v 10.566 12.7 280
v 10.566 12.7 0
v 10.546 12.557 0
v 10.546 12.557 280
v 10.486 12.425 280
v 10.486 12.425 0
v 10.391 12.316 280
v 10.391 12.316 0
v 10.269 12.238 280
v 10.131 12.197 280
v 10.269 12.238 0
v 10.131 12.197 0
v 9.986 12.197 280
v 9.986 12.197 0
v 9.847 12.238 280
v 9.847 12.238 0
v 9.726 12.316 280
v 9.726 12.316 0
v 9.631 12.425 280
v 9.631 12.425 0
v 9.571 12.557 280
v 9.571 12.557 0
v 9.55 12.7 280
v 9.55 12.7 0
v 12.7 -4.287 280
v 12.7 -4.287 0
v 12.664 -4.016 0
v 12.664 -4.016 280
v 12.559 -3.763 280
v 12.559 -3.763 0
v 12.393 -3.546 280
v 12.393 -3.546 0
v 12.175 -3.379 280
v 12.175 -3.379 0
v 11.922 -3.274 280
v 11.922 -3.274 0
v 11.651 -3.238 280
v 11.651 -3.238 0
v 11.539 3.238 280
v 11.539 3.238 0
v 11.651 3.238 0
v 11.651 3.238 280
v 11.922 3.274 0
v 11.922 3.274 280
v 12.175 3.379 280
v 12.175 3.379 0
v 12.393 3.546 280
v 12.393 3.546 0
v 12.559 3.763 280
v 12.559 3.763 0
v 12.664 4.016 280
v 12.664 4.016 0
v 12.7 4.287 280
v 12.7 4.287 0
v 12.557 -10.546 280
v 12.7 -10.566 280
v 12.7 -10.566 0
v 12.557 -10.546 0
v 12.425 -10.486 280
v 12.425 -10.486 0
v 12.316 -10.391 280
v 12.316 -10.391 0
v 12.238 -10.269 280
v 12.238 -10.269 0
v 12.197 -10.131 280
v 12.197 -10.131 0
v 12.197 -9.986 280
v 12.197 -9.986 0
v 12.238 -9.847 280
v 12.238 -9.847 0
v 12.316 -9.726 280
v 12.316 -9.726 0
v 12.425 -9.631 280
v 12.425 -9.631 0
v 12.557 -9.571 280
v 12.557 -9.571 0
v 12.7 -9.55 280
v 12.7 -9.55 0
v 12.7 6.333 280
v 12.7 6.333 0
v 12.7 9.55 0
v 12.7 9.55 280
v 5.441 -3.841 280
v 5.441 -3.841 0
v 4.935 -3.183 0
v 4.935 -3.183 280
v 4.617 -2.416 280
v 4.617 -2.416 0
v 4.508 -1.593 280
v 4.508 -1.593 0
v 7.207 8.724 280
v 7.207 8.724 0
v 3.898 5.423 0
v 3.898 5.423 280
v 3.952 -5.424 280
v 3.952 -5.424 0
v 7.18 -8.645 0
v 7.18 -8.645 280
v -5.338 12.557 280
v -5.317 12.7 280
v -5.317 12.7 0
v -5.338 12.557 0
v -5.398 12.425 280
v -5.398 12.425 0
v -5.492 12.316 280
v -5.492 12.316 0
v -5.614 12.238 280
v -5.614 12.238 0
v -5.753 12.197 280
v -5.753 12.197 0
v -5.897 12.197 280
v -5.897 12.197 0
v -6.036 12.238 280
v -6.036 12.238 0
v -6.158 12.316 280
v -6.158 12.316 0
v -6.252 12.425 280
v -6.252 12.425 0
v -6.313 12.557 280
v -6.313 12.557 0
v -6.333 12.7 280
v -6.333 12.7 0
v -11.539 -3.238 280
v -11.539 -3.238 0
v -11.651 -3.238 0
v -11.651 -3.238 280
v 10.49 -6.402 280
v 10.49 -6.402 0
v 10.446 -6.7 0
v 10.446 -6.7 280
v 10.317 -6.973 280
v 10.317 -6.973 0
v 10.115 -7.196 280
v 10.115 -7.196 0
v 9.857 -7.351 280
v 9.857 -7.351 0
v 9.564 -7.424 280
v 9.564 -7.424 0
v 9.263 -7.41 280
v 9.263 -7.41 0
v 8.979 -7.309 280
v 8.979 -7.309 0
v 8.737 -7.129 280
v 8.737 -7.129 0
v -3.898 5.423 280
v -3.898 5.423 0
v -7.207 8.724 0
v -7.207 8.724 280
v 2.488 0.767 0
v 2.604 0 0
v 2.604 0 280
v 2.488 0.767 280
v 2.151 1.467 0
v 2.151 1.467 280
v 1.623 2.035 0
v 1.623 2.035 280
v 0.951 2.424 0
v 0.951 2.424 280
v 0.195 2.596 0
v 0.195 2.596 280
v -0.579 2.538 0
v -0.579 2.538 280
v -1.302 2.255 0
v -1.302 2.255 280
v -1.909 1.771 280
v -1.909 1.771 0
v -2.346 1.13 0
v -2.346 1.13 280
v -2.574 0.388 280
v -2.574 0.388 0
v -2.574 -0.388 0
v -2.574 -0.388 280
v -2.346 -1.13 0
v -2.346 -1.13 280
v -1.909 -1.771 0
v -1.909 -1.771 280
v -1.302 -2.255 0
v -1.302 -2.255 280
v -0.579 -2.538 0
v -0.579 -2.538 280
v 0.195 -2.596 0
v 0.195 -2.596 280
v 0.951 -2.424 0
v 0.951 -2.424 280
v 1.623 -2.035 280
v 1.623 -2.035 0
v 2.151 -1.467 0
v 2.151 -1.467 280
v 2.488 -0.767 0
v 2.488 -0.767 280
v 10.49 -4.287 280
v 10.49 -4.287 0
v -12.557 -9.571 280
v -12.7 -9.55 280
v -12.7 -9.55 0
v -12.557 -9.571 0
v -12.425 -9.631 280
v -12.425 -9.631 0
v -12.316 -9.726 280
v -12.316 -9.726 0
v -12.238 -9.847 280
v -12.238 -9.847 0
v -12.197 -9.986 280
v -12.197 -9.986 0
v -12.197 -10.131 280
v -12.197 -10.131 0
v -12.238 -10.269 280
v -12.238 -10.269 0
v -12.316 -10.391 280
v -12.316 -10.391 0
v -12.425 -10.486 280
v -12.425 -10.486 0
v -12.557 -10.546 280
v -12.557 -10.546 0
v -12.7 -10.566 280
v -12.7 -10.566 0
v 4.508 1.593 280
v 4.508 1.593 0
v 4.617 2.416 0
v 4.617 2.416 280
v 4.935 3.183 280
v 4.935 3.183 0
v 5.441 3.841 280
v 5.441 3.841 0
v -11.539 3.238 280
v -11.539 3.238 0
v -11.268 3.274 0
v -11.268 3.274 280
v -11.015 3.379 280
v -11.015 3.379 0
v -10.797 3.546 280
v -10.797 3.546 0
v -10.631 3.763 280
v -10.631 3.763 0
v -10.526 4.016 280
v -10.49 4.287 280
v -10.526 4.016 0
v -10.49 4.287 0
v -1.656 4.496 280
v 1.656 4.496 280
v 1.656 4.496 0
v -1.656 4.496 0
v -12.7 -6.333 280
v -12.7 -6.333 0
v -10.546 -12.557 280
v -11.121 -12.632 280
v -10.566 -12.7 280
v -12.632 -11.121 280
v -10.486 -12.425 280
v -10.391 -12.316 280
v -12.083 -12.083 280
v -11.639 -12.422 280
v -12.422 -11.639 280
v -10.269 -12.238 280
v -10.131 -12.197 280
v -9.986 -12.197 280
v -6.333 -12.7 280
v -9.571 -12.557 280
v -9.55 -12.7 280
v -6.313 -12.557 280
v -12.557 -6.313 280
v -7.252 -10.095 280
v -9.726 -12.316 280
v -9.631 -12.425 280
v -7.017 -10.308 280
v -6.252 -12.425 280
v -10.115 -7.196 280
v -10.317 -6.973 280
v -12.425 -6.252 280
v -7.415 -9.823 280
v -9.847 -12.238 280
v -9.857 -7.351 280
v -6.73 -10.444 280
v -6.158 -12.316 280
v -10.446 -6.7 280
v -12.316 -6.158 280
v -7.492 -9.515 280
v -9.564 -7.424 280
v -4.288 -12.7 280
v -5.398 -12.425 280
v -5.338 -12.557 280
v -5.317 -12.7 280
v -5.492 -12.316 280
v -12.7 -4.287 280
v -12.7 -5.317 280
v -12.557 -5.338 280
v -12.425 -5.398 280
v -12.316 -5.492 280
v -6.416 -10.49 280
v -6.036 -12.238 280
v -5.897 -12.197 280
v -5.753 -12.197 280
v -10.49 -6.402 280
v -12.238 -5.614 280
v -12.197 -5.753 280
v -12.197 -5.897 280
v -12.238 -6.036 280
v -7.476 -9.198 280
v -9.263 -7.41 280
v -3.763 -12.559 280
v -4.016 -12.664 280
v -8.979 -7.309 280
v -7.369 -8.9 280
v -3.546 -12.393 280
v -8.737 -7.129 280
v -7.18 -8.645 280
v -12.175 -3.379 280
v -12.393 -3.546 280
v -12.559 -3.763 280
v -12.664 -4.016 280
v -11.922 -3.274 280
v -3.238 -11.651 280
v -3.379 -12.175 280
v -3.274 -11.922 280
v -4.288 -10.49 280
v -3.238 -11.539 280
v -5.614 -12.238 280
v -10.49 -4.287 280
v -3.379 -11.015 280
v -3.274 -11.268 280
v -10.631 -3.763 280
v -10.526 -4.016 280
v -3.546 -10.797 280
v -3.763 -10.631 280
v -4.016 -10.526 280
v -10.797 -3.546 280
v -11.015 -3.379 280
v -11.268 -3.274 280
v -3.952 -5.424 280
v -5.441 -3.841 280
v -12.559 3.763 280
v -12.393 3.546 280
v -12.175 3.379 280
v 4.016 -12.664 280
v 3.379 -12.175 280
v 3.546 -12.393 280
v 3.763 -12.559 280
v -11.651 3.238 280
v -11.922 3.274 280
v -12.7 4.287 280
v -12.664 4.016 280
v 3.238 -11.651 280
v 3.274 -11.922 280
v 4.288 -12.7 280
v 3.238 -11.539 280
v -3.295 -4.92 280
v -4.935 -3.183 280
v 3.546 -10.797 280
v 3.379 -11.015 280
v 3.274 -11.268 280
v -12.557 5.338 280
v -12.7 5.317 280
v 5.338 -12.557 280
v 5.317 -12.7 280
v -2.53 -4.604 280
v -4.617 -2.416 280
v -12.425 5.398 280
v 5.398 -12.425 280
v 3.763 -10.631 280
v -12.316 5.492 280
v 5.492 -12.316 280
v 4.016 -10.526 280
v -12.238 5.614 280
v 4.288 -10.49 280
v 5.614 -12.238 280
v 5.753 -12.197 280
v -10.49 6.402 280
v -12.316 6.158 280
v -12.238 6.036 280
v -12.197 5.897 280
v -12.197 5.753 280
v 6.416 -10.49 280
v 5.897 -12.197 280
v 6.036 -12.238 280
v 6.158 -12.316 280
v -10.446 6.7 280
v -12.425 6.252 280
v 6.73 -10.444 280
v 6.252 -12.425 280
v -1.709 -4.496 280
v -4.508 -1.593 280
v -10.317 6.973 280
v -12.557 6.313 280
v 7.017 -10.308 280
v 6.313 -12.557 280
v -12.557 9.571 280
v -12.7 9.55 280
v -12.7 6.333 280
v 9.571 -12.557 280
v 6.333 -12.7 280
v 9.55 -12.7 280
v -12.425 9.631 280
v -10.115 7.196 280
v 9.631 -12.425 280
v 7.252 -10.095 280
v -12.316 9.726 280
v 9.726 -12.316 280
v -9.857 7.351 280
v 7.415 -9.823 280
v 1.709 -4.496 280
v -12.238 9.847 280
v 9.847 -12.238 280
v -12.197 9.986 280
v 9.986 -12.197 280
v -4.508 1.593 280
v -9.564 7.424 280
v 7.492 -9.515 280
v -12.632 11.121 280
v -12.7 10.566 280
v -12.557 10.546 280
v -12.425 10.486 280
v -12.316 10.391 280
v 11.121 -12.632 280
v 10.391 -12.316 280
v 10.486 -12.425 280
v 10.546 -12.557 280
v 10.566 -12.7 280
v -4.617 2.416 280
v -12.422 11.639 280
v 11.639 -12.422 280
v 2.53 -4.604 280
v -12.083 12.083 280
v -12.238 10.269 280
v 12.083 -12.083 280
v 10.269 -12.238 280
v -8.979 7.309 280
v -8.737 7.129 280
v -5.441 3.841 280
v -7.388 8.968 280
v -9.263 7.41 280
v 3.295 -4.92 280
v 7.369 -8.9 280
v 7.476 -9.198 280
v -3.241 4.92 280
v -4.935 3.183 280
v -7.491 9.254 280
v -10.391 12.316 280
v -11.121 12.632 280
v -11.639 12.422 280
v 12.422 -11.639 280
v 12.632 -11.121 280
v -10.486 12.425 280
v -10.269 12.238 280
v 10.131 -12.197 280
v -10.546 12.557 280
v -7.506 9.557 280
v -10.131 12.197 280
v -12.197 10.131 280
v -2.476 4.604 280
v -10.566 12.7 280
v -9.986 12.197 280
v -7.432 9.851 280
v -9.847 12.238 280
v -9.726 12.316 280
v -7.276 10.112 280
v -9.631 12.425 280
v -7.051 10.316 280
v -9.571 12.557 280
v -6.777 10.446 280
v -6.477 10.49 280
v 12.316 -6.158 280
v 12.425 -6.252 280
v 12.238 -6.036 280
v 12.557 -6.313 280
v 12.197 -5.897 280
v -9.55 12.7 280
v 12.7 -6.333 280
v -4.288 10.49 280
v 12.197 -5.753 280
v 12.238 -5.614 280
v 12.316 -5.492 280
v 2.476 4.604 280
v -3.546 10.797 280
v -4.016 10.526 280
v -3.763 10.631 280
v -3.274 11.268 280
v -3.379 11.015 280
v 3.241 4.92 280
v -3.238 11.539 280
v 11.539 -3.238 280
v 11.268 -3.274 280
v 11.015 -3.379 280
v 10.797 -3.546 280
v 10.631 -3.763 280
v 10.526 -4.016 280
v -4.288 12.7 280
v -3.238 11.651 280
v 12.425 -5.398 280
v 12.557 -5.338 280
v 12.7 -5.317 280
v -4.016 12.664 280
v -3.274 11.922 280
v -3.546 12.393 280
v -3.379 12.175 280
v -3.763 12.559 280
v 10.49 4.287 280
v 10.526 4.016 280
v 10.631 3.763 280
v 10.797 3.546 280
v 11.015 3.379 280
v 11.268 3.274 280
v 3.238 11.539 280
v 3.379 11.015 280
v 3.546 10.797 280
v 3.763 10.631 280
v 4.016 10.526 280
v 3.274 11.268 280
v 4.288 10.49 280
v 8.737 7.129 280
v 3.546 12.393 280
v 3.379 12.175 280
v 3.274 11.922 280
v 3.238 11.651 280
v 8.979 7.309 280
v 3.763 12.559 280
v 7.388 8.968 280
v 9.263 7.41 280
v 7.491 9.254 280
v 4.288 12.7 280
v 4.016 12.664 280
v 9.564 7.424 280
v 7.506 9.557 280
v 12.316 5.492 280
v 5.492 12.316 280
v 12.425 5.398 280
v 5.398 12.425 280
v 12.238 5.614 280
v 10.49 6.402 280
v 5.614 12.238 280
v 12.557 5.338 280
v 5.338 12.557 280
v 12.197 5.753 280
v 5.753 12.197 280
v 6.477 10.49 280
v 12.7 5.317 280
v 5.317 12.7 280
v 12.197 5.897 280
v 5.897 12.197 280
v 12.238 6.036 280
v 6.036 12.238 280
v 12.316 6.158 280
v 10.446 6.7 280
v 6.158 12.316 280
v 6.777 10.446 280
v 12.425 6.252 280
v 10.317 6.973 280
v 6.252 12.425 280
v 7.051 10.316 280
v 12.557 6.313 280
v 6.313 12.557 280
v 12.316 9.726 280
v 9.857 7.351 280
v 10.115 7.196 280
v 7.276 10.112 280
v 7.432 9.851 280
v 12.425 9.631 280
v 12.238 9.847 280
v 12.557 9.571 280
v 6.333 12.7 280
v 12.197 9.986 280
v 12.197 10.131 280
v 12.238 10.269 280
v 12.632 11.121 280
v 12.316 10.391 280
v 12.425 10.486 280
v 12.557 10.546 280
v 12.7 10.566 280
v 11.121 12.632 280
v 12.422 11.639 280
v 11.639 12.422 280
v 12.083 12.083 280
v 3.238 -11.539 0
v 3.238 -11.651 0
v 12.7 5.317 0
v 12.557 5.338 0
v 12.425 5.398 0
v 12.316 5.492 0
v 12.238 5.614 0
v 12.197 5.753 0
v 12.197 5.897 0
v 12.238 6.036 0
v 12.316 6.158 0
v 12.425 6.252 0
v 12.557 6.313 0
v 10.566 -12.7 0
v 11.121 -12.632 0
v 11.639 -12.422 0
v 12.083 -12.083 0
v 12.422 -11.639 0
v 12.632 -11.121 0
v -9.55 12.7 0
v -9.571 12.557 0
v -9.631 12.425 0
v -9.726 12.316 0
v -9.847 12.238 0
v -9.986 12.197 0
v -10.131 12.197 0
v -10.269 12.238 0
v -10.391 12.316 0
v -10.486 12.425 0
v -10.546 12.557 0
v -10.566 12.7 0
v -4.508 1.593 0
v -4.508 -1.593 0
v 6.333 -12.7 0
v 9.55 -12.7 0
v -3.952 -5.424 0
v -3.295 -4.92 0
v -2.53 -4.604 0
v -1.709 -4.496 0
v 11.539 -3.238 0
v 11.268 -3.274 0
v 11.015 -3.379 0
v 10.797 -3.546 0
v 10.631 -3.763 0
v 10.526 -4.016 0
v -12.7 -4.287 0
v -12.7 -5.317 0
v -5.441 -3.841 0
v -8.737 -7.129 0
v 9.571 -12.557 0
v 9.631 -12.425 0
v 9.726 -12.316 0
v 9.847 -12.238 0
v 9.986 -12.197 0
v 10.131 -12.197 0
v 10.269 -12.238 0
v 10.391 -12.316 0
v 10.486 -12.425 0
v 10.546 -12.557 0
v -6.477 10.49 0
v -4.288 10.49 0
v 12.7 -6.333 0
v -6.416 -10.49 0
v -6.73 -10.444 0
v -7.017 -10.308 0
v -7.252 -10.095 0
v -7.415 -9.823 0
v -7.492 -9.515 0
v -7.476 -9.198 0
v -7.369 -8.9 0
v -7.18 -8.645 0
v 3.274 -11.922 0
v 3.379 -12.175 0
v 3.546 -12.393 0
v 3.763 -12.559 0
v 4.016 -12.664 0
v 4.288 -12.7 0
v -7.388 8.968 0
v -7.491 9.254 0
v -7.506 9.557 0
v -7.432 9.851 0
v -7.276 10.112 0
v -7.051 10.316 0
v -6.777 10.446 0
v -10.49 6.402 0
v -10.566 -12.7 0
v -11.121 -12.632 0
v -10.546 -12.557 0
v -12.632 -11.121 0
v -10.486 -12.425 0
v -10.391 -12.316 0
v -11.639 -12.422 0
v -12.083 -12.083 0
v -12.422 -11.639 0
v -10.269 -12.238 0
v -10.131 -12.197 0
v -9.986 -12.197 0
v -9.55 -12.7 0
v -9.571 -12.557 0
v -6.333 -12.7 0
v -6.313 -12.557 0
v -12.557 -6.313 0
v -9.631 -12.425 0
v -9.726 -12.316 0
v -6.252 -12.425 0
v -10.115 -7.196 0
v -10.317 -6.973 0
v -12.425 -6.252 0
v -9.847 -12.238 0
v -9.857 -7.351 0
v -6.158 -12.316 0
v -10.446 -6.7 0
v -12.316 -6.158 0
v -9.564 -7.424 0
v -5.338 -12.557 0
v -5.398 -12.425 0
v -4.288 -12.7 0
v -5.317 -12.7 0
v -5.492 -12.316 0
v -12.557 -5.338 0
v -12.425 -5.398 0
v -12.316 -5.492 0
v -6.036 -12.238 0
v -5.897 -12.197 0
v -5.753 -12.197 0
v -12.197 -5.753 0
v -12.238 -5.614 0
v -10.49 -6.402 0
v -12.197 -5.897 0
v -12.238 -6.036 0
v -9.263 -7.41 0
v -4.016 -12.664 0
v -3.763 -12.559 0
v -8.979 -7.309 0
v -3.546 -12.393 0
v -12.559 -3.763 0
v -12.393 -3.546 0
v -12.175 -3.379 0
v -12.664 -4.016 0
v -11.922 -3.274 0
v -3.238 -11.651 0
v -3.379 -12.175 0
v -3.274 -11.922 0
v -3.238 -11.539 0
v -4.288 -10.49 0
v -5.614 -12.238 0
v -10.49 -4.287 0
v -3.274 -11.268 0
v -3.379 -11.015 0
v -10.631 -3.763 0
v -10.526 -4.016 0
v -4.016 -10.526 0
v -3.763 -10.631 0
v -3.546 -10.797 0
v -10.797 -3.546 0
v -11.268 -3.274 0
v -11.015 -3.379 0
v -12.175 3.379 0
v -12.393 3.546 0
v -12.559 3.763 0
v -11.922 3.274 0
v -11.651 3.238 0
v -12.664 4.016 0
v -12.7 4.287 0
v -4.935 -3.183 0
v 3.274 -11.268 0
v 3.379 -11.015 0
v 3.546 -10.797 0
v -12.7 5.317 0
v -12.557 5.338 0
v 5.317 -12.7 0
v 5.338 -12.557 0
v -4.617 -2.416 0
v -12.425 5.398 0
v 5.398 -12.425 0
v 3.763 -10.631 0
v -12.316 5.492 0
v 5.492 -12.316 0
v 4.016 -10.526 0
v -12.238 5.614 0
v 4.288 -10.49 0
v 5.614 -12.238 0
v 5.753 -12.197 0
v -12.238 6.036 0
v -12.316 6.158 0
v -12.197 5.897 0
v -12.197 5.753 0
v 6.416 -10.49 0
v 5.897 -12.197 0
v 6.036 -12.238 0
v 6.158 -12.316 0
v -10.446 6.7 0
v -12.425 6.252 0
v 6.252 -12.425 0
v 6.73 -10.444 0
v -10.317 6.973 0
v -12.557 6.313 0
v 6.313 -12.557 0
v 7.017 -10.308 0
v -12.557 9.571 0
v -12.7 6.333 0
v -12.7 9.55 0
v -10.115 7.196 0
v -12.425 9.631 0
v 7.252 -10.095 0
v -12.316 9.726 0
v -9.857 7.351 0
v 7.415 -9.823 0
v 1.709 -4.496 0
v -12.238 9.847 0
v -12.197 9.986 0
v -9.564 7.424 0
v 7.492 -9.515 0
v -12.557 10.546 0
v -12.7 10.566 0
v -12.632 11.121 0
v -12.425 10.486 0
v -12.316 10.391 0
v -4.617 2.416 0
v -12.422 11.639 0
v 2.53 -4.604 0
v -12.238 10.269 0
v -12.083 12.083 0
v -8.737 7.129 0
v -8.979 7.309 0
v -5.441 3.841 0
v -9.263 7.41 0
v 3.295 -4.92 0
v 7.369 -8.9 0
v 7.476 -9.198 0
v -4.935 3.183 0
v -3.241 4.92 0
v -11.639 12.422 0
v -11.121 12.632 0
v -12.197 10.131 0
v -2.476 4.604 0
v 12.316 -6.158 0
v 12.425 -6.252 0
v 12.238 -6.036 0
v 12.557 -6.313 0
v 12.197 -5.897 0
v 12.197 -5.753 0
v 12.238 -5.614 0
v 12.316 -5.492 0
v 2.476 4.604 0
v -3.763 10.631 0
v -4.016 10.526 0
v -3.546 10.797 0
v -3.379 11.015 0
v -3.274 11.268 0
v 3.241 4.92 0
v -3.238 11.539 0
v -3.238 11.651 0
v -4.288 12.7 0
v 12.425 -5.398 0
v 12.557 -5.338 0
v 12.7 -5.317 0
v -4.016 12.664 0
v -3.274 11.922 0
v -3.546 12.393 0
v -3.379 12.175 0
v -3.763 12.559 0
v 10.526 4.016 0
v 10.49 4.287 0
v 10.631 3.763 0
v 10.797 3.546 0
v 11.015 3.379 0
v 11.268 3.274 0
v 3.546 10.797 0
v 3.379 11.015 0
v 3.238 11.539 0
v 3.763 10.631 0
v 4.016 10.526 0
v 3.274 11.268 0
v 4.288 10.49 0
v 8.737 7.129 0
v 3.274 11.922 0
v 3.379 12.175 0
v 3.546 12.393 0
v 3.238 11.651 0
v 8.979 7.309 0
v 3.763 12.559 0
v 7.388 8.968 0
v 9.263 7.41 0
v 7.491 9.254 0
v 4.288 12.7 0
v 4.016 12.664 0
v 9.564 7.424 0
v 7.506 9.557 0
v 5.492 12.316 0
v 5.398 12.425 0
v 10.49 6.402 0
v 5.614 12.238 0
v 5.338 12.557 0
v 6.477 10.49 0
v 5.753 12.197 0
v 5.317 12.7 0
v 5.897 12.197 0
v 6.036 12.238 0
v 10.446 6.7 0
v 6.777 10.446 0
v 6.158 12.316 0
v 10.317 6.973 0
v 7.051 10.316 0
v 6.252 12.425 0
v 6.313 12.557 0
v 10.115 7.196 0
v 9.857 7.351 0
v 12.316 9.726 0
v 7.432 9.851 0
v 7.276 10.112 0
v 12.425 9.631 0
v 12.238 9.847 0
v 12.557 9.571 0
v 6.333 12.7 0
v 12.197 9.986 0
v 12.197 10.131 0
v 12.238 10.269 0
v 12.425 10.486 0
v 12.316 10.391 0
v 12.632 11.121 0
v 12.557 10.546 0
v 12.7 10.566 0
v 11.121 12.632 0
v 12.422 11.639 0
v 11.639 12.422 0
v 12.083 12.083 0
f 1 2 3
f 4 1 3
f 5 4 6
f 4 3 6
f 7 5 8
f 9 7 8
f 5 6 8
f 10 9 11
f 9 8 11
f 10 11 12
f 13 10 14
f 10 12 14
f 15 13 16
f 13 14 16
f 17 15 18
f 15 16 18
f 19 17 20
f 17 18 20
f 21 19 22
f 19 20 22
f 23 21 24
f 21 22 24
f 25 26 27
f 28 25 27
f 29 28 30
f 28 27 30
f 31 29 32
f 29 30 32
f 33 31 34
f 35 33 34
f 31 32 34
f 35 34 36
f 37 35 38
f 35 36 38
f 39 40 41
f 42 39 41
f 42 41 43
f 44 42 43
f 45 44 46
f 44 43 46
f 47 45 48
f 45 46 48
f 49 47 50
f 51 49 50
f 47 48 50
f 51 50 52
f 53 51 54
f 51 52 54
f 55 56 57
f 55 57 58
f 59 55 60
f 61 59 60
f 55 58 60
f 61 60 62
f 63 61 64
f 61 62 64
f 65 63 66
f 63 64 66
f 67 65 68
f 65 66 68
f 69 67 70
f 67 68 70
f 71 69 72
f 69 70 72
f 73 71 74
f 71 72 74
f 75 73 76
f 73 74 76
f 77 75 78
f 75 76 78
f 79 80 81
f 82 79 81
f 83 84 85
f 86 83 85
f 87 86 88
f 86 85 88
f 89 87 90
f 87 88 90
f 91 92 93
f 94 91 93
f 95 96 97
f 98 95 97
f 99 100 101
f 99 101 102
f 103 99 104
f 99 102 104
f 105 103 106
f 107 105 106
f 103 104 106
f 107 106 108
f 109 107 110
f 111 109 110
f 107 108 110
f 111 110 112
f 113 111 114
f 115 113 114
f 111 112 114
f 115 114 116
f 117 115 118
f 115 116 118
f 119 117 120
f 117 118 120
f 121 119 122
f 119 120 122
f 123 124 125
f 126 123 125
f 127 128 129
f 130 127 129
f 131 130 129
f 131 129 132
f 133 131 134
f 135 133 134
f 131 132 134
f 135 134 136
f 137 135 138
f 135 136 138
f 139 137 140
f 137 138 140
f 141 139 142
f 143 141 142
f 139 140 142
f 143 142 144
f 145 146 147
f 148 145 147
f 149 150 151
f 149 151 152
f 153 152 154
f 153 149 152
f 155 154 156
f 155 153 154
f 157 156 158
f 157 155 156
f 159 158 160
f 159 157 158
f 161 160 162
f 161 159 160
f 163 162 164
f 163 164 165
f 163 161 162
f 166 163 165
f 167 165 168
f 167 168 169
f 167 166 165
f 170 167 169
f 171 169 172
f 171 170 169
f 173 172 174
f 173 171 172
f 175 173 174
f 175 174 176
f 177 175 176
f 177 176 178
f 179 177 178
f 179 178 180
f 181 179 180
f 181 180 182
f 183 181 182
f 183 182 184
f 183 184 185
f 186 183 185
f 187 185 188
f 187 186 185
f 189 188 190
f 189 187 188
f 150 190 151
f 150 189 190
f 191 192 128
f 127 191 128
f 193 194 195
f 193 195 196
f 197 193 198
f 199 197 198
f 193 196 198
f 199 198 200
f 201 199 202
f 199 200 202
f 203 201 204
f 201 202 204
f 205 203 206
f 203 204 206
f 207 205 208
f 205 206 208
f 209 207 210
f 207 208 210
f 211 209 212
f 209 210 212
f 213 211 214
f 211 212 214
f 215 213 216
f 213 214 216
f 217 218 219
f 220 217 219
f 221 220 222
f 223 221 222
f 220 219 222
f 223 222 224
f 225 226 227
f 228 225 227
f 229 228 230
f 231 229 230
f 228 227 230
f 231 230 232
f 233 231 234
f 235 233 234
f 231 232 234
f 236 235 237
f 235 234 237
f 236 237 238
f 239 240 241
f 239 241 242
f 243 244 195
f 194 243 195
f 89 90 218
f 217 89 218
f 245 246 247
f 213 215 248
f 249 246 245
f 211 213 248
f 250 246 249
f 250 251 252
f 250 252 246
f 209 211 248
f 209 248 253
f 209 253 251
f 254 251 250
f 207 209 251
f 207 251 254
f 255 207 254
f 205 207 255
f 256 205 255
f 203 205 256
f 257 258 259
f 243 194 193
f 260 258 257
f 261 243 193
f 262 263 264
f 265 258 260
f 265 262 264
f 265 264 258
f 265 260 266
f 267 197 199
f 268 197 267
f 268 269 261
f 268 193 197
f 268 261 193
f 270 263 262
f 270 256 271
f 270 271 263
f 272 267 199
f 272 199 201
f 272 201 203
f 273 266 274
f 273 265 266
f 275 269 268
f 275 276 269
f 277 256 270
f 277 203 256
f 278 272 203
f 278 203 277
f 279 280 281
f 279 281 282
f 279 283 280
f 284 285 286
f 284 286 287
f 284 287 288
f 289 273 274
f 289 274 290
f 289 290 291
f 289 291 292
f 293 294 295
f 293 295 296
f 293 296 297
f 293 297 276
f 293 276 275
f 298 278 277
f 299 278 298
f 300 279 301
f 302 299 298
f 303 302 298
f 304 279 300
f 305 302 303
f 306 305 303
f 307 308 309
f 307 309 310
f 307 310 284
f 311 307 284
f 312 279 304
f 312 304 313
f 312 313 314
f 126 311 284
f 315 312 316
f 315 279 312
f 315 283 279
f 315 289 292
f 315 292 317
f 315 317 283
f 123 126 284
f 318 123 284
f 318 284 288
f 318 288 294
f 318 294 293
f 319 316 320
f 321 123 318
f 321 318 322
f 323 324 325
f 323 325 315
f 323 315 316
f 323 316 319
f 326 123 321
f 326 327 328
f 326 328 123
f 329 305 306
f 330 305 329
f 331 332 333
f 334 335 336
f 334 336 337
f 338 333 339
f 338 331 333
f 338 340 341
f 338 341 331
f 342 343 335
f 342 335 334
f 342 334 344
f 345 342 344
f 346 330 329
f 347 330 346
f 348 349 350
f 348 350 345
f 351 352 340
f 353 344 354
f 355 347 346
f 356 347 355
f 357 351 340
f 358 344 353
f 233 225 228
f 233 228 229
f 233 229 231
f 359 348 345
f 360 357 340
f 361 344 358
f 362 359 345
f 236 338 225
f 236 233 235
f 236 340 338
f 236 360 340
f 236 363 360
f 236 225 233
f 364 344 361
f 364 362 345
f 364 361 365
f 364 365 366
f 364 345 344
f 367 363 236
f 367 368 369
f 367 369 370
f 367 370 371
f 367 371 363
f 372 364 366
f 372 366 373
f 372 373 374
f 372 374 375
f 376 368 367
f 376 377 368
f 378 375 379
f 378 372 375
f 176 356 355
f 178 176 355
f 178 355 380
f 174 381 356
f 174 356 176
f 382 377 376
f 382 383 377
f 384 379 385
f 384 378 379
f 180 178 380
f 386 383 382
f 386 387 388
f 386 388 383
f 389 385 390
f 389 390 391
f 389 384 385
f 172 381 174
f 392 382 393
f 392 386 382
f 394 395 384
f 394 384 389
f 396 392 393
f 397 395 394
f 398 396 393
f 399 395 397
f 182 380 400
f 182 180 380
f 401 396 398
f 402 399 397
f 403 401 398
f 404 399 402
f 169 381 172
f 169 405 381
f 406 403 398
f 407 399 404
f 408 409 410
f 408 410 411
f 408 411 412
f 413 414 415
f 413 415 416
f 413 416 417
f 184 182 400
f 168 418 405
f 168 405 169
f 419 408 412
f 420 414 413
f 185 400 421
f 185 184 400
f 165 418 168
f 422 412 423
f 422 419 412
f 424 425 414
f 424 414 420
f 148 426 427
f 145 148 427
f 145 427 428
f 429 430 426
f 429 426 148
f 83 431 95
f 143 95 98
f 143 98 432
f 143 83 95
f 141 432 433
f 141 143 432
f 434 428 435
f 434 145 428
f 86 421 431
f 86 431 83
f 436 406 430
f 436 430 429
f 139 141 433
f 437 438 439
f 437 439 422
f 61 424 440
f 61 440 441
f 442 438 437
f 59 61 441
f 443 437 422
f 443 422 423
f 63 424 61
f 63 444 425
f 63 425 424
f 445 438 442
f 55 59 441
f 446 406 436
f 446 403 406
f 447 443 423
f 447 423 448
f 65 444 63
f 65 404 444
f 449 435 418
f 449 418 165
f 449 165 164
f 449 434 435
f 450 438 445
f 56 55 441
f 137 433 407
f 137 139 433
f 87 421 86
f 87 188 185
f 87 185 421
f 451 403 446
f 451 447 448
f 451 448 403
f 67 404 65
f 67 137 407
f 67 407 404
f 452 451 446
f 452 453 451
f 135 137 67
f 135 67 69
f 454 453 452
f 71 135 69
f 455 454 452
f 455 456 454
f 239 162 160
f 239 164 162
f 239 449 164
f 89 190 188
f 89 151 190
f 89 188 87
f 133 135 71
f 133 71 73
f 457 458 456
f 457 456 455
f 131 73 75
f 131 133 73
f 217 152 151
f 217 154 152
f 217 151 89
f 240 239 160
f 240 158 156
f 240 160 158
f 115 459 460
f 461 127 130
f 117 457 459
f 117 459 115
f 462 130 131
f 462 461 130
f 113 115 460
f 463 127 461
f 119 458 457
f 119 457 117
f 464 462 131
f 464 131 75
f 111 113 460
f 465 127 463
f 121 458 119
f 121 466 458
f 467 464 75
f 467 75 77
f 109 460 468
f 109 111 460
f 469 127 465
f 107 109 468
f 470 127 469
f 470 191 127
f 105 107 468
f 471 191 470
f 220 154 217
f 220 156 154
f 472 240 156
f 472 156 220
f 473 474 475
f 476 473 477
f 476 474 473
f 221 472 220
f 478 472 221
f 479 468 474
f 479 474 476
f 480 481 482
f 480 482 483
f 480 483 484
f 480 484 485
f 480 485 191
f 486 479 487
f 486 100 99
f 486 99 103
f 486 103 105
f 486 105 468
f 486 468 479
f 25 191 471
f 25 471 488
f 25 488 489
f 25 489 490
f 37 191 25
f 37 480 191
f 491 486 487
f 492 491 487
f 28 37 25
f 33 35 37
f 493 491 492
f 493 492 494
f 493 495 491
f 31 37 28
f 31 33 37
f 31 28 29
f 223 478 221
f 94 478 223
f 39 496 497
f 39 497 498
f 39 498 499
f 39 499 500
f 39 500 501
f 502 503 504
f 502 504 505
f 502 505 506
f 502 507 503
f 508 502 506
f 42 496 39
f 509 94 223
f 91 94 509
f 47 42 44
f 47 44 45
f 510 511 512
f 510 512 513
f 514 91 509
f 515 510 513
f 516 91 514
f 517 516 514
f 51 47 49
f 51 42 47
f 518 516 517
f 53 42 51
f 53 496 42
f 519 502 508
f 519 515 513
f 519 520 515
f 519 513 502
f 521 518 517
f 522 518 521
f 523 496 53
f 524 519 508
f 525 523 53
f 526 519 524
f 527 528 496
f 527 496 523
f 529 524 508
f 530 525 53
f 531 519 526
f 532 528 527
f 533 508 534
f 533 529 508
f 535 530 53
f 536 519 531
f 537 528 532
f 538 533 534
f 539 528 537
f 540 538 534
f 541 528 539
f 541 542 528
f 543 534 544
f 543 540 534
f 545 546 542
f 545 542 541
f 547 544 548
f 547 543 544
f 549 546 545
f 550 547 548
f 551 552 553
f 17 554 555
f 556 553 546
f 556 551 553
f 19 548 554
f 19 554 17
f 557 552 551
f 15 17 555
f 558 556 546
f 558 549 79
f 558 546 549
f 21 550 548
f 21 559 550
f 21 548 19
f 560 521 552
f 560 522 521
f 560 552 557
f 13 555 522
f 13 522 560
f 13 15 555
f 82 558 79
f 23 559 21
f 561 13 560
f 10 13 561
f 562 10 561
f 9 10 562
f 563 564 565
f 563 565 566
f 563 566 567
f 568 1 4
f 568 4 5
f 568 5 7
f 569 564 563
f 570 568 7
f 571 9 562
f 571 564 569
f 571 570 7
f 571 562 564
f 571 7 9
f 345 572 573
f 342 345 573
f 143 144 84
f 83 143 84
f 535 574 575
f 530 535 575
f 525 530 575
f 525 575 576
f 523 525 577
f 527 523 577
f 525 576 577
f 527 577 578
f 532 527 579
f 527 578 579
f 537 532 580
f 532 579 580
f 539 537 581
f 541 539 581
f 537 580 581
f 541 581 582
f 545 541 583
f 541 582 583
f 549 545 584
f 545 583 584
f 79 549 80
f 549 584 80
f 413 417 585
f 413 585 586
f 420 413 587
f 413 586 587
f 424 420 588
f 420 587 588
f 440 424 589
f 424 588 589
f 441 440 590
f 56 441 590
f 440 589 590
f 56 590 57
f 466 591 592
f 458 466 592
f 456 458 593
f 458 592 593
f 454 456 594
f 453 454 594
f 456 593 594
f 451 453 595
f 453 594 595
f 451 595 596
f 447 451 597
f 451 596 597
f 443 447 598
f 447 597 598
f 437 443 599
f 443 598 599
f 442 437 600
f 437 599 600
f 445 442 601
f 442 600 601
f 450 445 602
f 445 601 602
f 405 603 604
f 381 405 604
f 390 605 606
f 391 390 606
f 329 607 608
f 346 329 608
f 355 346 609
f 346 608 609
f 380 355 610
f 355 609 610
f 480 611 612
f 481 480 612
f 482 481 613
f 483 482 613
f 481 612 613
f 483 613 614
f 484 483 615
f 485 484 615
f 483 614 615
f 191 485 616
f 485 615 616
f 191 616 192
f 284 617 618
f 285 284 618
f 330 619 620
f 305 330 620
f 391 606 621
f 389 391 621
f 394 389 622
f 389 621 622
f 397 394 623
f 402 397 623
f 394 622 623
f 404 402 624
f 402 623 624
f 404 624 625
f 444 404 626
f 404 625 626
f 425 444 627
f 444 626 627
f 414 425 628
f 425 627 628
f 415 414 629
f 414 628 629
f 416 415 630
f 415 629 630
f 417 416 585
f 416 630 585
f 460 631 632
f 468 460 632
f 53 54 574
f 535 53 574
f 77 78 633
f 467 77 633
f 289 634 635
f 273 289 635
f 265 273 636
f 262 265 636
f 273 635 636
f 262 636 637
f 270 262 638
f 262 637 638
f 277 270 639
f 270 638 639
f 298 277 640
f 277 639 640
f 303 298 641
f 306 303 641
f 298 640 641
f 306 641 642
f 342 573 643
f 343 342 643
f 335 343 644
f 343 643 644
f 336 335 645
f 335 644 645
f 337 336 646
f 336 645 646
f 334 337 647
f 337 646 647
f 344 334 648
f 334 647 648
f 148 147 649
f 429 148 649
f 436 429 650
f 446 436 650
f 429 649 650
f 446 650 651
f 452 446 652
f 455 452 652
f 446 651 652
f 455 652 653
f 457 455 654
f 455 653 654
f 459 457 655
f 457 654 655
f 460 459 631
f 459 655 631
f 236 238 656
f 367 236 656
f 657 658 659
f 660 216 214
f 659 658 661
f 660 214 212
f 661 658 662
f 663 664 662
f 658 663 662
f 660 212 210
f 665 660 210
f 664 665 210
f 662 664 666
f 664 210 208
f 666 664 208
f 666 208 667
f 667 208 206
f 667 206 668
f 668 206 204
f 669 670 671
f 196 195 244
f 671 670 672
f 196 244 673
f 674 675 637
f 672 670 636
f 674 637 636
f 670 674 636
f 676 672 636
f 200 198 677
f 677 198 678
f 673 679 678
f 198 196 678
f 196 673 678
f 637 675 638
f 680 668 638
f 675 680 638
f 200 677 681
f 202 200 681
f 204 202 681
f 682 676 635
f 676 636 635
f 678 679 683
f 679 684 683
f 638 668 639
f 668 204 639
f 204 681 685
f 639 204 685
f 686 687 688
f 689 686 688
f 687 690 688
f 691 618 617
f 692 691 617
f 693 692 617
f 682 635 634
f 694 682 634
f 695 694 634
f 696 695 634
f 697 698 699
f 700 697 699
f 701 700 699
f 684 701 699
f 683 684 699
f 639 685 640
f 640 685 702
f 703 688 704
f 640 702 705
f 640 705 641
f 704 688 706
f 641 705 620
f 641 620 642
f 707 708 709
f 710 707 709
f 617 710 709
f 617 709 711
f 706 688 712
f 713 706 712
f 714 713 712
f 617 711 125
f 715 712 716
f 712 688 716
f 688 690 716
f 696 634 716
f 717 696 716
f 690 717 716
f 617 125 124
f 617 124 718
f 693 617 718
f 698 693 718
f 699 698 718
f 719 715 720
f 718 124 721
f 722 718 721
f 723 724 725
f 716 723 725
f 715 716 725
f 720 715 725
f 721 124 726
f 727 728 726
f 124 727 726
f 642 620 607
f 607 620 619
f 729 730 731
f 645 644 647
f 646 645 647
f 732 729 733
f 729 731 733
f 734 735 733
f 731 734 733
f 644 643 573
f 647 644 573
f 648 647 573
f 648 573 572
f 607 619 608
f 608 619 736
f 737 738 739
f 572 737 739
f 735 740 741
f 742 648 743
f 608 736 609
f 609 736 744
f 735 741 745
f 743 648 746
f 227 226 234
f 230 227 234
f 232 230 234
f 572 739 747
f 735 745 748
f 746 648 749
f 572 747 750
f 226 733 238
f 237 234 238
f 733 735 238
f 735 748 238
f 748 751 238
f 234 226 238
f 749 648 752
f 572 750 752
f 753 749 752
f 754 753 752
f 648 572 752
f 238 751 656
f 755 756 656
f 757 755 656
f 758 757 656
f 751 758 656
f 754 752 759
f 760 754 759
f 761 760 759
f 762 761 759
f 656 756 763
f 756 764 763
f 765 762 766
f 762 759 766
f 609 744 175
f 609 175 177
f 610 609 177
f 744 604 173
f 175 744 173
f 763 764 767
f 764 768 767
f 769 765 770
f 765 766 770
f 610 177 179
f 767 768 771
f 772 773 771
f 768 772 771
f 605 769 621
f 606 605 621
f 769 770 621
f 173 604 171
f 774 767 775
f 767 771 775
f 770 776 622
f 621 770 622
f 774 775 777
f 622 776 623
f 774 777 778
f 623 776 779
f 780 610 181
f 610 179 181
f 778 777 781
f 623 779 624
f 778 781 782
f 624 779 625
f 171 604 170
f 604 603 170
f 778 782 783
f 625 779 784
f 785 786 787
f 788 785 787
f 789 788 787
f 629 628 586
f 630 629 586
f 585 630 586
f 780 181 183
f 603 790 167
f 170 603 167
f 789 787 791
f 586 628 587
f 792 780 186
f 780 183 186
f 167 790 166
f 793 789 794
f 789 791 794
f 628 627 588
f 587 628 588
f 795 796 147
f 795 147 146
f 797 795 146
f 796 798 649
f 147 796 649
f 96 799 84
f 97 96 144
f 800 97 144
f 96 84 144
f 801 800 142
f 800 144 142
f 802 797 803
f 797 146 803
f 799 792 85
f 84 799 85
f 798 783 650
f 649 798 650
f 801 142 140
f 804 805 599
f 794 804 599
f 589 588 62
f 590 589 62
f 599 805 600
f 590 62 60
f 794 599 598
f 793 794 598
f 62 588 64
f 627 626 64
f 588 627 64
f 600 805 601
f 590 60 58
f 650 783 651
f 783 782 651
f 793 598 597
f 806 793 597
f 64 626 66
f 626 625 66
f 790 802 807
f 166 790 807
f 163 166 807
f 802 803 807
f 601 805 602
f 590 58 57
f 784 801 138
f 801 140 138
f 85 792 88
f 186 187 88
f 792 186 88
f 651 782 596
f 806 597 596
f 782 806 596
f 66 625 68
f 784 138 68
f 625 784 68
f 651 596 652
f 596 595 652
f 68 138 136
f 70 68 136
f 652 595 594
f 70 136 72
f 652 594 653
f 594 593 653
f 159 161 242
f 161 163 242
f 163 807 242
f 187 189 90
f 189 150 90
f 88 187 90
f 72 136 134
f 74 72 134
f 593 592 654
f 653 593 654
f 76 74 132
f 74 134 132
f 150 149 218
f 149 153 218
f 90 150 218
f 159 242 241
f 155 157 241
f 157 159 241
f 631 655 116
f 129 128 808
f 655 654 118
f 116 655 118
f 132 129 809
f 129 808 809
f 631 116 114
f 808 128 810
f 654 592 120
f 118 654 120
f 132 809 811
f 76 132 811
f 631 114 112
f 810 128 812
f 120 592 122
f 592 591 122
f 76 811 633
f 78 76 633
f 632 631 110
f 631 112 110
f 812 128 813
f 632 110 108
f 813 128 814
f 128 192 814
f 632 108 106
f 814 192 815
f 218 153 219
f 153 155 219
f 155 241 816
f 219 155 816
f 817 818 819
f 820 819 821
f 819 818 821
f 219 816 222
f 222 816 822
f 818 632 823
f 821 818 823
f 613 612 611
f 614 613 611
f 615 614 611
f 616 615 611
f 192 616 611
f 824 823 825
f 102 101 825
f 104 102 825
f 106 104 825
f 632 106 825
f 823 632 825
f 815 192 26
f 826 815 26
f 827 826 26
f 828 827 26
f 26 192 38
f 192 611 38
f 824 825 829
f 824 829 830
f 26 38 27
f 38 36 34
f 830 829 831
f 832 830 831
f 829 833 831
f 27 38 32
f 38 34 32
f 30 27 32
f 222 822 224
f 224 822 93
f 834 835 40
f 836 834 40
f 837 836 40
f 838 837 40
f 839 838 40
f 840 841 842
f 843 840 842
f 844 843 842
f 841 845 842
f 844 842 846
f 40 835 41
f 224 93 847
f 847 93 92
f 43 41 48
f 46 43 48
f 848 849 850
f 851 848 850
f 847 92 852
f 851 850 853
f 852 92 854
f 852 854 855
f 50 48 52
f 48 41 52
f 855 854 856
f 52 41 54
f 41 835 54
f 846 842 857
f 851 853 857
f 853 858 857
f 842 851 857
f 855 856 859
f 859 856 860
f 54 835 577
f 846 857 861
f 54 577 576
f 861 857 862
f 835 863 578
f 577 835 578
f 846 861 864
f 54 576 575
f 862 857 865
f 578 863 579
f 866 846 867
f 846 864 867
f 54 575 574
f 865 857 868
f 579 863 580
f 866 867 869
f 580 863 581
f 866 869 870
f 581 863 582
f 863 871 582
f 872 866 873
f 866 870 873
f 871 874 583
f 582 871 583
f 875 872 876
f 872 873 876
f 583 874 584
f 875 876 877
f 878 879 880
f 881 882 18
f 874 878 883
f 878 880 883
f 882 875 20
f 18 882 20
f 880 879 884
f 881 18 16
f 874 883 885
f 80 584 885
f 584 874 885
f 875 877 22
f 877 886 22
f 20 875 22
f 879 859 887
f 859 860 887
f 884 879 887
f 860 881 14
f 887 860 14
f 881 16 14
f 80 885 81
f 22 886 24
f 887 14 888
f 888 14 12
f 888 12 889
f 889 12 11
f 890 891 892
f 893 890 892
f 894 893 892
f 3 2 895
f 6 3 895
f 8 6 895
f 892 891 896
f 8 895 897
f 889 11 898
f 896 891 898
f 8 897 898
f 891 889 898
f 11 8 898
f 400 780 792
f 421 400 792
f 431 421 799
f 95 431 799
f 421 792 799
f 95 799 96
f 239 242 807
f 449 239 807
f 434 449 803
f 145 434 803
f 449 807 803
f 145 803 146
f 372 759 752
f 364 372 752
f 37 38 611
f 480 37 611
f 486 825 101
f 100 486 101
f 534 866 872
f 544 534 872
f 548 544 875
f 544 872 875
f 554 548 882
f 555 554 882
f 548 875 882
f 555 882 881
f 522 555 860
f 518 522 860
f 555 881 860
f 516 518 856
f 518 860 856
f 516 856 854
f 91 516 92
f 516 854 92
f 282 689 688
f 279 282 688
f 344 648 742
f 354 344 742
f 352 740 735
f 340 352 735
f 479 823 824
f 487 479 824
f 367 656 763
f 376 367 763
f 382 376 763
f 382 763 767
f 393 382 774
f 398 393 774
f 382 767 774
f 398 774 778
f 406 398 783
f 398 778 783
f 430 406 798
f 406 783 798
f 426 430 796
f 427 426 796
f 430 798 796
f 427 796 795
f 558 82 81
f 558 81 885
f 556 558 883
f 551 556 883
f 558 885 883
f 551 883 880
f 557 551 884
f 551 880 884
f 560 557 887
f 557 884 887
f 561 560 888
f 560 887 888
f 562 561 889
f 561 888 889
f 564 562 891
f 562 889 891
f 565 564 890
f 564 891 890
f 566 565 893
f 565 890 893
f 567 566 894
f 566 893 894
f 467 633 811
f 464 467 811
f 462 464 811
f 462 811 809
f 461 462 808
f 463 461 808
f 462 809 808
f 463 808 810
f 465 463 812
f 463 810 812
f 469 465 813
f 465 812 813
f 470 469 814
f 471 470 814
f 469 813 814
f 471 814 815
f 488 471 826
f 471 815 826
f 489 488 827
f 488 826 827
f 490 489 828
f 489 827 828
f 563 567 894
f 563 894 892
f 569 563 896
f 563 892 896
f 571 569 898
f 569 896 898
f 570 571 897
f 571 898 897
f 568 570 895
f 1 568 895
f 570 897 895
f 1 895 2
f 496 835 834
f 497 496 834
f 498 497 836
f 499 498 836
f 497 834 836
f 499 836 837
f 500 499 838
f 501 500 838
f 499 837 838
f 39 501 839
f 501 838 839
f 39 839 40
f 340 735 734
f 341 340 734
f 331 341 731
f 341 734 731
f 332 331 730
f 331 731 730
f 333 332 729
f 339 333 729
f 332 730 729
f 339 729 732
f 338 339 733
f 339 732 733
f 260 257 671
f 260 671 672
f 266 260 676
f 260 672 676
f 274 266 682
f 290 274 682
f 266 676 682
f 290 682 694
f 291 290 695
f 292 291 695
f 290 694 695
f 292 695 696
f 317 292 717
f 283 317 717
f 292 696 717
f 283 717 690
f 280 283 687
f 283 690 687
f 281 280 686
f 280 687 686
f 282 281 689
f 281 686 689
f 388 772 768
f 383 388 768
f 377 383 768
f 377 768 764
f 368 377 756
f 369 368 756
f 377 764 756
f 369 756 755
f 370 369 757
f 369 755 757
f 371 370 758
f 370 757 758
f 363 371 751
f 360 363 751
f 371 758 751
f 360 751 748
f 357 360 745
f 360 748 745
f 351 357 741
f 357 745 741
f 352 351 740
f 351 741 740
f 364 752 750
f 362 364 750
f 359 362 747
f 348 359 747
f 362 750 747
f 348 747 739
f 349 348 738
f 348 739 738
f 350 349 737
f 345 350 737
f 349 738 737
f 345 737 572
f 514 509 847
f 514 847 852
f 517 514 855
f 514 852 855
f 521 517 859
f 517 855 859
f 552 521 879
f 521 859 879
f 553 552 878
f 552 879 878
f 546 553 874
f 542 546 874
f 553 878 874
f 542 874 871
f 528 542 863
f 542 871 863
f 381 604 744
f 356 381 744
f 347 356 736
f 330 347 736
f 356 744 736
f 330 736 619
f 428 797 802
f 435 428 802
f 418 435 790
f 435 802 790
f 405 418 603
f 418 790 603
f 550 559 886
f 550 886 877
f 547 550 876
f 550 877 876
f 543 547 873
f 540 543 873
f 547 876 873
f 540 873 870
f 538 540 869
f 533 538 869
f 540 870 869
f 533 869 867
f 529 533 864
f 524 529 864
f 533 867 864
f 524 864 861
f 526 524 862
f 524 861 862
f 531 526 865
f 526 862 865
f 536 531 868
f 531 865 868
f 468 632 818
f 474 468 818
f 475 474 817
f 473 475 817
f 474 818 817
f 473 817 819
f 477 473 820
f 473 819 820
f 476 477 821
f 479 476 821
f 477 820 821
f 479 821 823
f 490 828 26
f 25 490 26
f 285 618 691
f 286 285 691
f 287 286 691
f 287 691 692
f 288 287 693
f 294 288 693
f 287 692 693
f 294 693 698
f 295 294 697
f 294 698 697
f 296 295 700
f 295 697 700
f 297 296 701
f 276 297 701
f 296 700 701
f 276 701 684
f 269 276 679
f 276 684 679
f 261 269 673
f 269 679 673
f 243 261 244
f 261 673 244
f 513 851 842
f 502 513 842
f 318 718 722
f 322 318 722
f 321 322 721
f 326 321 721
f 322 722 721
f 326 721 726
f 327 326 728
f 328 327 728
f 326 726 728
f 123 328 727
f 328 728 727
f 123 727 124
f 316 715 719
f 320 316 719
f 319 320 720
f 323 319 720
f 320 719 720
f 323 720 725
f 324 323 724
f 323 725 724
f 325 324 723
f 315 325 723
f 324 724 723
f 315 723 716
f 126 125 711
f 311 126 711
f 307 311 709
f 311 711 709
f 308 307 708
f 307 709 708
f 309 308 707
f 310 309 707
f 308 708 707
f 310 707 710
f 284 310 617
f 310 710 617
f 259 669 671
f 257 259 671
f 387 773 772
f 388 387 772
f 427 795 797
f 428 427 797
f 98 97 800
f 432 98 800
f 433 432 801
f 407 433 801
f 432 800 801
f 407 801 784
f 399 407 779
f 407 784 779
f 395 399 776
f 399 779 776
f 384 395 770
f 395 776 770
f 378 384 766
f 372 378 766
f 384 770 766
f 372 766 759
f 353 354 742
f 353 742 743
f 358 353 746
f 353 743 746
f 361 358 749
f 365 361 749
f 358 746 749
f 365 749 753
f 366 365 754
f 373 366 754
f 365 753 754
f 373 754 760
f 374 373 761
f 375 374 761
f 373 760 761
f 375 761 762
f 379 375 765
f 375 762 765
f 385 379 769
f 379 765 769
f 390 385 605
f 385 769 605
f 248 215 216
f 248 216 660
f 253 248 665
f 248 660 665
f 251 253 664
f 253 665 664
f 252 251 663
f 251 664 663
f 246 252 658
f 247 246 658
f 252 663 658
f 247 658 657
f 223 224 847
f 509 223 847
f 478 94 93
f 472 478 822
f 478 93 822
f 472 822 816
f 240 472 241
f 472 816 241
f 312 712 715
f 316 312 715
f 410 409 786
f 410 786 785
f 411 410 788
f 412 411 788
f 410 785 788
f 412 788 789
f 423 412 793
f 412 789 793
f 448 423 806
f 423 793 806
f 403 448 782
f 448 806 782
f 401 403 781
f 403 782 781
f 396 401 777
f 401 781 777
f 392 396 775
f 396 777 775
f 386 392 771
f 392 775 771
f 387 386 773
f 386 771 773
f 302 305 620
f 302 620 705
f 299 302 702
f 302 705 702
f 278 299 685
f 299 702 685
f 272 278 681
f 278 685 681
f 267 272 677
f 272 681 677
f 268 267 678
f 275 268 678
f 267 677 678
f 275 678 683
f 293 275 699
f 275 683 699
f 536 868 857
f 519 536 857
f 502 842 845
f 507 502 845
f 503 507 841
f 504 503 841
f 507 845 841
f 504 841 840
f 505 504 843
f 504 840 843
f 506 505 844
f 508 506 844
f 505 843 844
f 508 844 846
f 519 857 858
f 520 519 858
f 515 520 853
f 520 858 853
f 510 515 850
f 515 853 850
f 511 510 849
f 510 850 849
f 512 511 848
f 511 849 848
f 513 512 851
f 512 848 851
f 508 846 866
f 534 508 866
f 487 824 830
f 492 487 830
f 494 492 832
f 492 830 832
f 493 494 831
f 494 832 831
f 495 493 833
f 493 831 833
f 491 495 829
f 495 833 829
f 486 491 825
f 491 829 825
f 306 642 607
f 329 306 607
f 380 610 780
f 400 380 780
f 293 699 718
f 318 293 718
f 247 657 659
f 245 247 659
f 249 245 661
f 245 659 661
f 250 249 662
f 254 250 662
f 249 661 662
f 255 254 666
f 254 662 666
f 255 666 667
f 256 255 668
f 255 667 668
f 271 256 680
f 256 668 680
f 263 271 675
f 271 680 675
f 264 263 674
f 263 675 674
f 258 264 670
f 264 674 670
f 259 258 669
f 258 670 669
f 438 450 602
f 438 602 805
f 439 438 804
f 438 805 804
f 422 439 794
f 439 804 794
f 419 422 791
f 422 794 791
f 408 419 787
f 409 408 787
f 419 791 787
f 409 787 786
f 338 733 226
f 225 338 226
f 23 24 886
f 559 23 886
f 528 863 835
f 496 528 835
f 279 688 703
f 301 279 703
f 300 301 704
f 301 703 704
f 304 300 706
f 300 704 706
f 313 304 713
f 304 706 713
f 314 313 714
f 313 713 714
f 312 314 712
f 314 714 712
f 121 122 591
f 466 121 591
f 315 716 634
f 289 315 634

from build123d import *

# Parameters (mm, degrees)
SKETCH1_R           = 2.6035
BOSS_EXTRUDE1_DEPTH = 280


with BuildPart() as part:
    # Sketch1 → Boss-Extrude1 (new body)
    with BuildSketch(Plane.XY):
        with BuildLine():
            Line((-7.179650497, -8.645192506), (-3.952270251, -5.423690499))
            ThreePointArc((-3.952270251, -5.423690499), (-2.922936451, -4.736929036), (-1.709253557, -4.4958))
            Line((-1.709253557, -4.4958), (1.709253557, -4.4958))
            ThreePointArc((1.709253557, -4.4958), (2.922936451, -4.736929036), (3.952270251, -5.423690499))
            Line((3.952270251, -5.423690499), (7.179650497, -8.645192506))
            ThreePointArc((7.179650497, -8.645192506), (7.41473083, -9.822813117), (6.416408329, -10.4902))
            Line((6.416408329, -10.4902), (4.287512407, -10.4902))
            ThreePointArc((4.287512407, -10.4902), (3.54574862, -10.79744862), (3.2385, -11.539212407))
            Line((3.2385, -11.539212407), (3.2385, -11.650987593))
            ThreePointArc((3.2385, -11.650987593), (3.54574862, -12.39275138), (4.287512407, -12.7))
            Line((4.287512407, -12.7), (5.317126718, -12.7))
            ThreePointArc((5.317126718, -12.7), (5.825126718, -12.192), (6.333126718, -12.7))
            Line((6.333126718, -12.7), (9.550443118, -12.7))
            ThreePointArc((9.550443118, -12.7), (10.058366869, -12.192000006), (10.566443095, -12.699847501))
            ThreePointArc((10.566443095, -12.699847501), (12.082537762, -12.08250727), (12.699846982, -10.566399977))
            ThreePointArc((12.699846982, -10.566399977), (12.192000006, -10.058323491), (12.7, -9.5504))
            Line((12.7, -9.5504), (12.7, -6.3330836))
            ThreePointArc((12.7, -6.3330836), (12.192, -5.8250836), (12.7, -5.3170836))
            Line((12.7, -5.3170836), (12.7, -4.287469289))
            ThreePointArc((12.7, -4.287469289), (12.39275138, -3.545705502), (11.650987593, -3.238456882))
            Line((11.650987593, -3.238456882), (11.539212407, -3.238456882))
            ThreePointArc((11.539212407, -3.238456882), (10.79744862, -3.545705502), (10.4902, -4.287469289))
            Line((10.4902, -4.287469289), (10.4902, -6.402089023))
            ThreePointArc((10.4902, -6.402089023), (9.856505071, -7.351067942), (8.737131347, -7.129408934))
            Line((8.737131347, -7.129408934), (5.441005833, -3.840816462))
            ThreePointArc((5.441005833, -3.840816462), (4.750877967, -2.809883091), (4.5085, -1.593185507))
            Line((4.5085, -1.593185507), (4.5085, 1.593185507))
            ThreePointArc((4.5085, 1.593185507), (4.750877967, 2.809883091), (5.441005833, 3.840816462))
            Line((5.441005833, 3.840816462), (8.737131347, 7.129408934))
            ThreePointArc((8.737131347, 7.129408934), (9.856505071, 7.351067942), (10.4902, 6.402089023))
            Line((10.4902, 6.402089023), (10.4902, 4.287469289))
            ThreePointArc((10.4902, 4.287469289), (10.79744862, 3.545705502), (11.539212407, 3.238456882))
            Line((11.539212407, 3.238456882), (11.650987593, 3.238456882))
            ThreePointArc((11.650987593, 3.238456882), (12.39275138, 3.545705502), (12.7, 4.287469289))
            Line((12.7, 4.287469289), (12.7, 5.3170836))
            ThreePointArc((12.7, 5.3170836), (12.192, 5.8250836), (12.7, 6.3330836))
            Line((12.7, 6.3330836), (12.7, 9.5504))
            ThreePointArc((12.7, 9.5504), (12.192000006, 10.058323491), (12.699846982, 10.566399977))
            ThreePointArc((12.699846982, 10.566399977), (12.082537762, 12.08250727), (10.566443095, 12.699847501))
            ThreePointArc((10.566443095, 12.699847501), (10.058366869, 12.192000006), (9.550443118, 12.7))
            Line((9.550443118, 12.7), (6.333126718, 12.7))
            ThreePointArc((6.333126718, 12.7), (5.825126718, 12.192), (5.317126718, 12.7))
            Line((5.317126718, 12.7), (4.287512407, 12.7))
            ThreePointArc((4.287512407, 12.7), (3.54574862, 12.39275138), (3.2385, 11.650987593))
            Line((3.2385, 11.650987593), (3.2385, 11.539212407))
            ThreePointArc((3.2385, 11.539212407), (3.54574862, 10.79744862), (4.287512407, 10.4902))
            Line((4.287512407, 10.4902), (6.476788598, 10.4902))
            ThreePointArc((6.476788598, 10.4902), (7.432222385, 9.85140422), (7.207036008, 8.724370562))
            Line((7.207036008, 8.724370562), (3.898272566, 5.423169045))
            ThreePointArc((3.898272566, 5.423169045), (2.869120213, 4.736787962), (1.655778399, 4.4958))
            Line((1.655778399, 4.4958), (-1.655778399, 4.4958))
            ThreePointArc((-1.655778399, 4.4958), (-2.869120213, 4.736787962), (-3.898272566, 5.423169045))
            Line((-3.898272566, 5.423169045), (-7.207036008, 8.724370562))
            ThreePointArc((-7.207036008, 8.724370562), (-7.432222385, 9.85140422), (-6.476788598, 10.4902))
            Line((-6.476788598, 10.4902), (-4.287512407, 10.4902))
            ThreePointArc((-4.287512407, 10.4902), (-3.54574862, 10.79744862), (-3.2385, 11.539212407))
            Line((-3.2385, 11.539212407), (-3.2385, 11.650987593))
            ThreePointArc((-3.2385, 11.650987593), (-3.54574862, 12.39275138), (-4.287512407, 12.7))
            Line((-4.287512407, 12.7), (-5.317126718, 12.7))
            ThreePointArc((-5.317126718, 12.7), (-5.825126718, 12.192), (-6.333126718, 12.7))
            Line((-6.333126718, 12.7), (-9.550443118, 12.7))
            ThreePointArc((-9.550443118, 12.7), (-10.058366869, 12.192000006), (-10.566443095, 12.699847501))
            ThreePointArc((-10.566443095, 12.699847501), (-12.082537762, 12.08250727), (-12.699846982, 10.566399977))
            ThreePointArc((-12.699846982, 10.566399977), (-12.192000006, 10.058323491), (-12.7, 9.5504))
            Line((-12.7, 9.5504), (-12.7, 6.3330836))
            ThreePointArc((-12.7, 6.3330836), (-12.192, 5.8250836), (-12.7, 5.3170836))
            Line((-12.7, 5.3170836), (-12.7, 4.287469289))
            ThreePointArc((-12.7, 4.287469289), (-12.39275138, 3.545705502), (-11.650987593, 3.238456882))
            Line((-11.650987593, 3.238456882), (-11.539212407, 3.238456882))
            ThreePointArc((-11.539212407, 3.238456882), (-10.79744862, 3.545705502), (-10.4902, 4.287469289))
            Line((-10.4902, 4.287469289), (-10.4902, 6.402089023))
            ThreePointArc((-10.4902, 6.402089023), (-9.856505071, 7.351067942), (-8.737131347, 7.129408934))
            Line((-8.737131347, 7.129408934), (-5.441005833, 3.840816462))
            ThreePointArc((-5.441005833, 3.840816462), (-4.750877967, 2.809883091), (-4.5085, 1.593185507))
            Line((-4.5085, 1.593185507), (-4.5085, -1.593185507))
            ThreePointArc((-4.5085, -1.593185507), (-4.750877967, -2.809883091), (-5.441005833, -3.840816462))
            Line((-5.441005833, -3.840816462), (-8.737131347, -7.129408934))
            ThreePointArc((-8.737131347, -7.129408934), (-9.856505071, -7.351067942), (-10.4902, -6.402089023))
            Line((-10.4902, -6.402089023), (-10.4902, -4.287469289))
            ThreePointArc((-10.4902, -4.287469289), (-10.79744862, -3.545705502), (-11.539212407, -3.238456882))
            Line((-11.539212407, -3.238456882), (-11.650987593, -3.238456882))
            ThreePointArc((-11.650987593, -3.238456882), (-12.39275138, -3.545705502), (-12.7, -4.287469289))
            Line((-12.7, -4.287469289), (-12.7, -5.3170836))
            ThreePointArc((-12.7, -5.3170836), (-12.192, -5.8250836), (-12.7, -6.3330836))
            Line((-12.7, -6.3330836), (-12.7, -9.5504))
            ThreePointArc((-12.7, -9.5504), (-12.192000006, -10.058323491), (-12.699846982, -10.566399977))
            ThreePointArc((-12.699846982, -10.566399977), (-12.082537762, -12.08250727), (-10.566443095, -12.699847501))
            ThreePointArc((-10.566443095, -12.699847501), (-10.058366869, -12.192000006), (-9.550443118, -12.7))
            Line((-9.550443118, -12.7), (-6.333126718, -12.7))
            ThreePointArc((-6.333126718, -12.7), (-5.825126718, -12.192), (-5.317126718, -12.7))
            Line((-5.317126718, -12.7), (-4.287512407, -12.7))
            ThreePointArc((-4.287512407, -12.7), (-3.54574862, -12.39275138), (-3.2385, -11.650987593))
            Line((-3.2385, -11.650987593), (-3.2385, -11.539212407))
            ThreePointArc((-3.2385, -11.539212407), (-3.54574862, -10.79744862), (-4.287512407, -10.4902))
            Line((-4.287512407, -10.4902), (-6.416408329, -10.4902))
            ThreePointArc((-6.416408329, -10.4902), (-7.41473083, -9.822813117), (-7.179650497, -8.645192506))
        make_face()
        Circle(SKETCH1_R, mode=Mode.SUBTRACT)
    extrude(amount=BOSS_EXTRUDE1_DEPTH)


solid = part.part
